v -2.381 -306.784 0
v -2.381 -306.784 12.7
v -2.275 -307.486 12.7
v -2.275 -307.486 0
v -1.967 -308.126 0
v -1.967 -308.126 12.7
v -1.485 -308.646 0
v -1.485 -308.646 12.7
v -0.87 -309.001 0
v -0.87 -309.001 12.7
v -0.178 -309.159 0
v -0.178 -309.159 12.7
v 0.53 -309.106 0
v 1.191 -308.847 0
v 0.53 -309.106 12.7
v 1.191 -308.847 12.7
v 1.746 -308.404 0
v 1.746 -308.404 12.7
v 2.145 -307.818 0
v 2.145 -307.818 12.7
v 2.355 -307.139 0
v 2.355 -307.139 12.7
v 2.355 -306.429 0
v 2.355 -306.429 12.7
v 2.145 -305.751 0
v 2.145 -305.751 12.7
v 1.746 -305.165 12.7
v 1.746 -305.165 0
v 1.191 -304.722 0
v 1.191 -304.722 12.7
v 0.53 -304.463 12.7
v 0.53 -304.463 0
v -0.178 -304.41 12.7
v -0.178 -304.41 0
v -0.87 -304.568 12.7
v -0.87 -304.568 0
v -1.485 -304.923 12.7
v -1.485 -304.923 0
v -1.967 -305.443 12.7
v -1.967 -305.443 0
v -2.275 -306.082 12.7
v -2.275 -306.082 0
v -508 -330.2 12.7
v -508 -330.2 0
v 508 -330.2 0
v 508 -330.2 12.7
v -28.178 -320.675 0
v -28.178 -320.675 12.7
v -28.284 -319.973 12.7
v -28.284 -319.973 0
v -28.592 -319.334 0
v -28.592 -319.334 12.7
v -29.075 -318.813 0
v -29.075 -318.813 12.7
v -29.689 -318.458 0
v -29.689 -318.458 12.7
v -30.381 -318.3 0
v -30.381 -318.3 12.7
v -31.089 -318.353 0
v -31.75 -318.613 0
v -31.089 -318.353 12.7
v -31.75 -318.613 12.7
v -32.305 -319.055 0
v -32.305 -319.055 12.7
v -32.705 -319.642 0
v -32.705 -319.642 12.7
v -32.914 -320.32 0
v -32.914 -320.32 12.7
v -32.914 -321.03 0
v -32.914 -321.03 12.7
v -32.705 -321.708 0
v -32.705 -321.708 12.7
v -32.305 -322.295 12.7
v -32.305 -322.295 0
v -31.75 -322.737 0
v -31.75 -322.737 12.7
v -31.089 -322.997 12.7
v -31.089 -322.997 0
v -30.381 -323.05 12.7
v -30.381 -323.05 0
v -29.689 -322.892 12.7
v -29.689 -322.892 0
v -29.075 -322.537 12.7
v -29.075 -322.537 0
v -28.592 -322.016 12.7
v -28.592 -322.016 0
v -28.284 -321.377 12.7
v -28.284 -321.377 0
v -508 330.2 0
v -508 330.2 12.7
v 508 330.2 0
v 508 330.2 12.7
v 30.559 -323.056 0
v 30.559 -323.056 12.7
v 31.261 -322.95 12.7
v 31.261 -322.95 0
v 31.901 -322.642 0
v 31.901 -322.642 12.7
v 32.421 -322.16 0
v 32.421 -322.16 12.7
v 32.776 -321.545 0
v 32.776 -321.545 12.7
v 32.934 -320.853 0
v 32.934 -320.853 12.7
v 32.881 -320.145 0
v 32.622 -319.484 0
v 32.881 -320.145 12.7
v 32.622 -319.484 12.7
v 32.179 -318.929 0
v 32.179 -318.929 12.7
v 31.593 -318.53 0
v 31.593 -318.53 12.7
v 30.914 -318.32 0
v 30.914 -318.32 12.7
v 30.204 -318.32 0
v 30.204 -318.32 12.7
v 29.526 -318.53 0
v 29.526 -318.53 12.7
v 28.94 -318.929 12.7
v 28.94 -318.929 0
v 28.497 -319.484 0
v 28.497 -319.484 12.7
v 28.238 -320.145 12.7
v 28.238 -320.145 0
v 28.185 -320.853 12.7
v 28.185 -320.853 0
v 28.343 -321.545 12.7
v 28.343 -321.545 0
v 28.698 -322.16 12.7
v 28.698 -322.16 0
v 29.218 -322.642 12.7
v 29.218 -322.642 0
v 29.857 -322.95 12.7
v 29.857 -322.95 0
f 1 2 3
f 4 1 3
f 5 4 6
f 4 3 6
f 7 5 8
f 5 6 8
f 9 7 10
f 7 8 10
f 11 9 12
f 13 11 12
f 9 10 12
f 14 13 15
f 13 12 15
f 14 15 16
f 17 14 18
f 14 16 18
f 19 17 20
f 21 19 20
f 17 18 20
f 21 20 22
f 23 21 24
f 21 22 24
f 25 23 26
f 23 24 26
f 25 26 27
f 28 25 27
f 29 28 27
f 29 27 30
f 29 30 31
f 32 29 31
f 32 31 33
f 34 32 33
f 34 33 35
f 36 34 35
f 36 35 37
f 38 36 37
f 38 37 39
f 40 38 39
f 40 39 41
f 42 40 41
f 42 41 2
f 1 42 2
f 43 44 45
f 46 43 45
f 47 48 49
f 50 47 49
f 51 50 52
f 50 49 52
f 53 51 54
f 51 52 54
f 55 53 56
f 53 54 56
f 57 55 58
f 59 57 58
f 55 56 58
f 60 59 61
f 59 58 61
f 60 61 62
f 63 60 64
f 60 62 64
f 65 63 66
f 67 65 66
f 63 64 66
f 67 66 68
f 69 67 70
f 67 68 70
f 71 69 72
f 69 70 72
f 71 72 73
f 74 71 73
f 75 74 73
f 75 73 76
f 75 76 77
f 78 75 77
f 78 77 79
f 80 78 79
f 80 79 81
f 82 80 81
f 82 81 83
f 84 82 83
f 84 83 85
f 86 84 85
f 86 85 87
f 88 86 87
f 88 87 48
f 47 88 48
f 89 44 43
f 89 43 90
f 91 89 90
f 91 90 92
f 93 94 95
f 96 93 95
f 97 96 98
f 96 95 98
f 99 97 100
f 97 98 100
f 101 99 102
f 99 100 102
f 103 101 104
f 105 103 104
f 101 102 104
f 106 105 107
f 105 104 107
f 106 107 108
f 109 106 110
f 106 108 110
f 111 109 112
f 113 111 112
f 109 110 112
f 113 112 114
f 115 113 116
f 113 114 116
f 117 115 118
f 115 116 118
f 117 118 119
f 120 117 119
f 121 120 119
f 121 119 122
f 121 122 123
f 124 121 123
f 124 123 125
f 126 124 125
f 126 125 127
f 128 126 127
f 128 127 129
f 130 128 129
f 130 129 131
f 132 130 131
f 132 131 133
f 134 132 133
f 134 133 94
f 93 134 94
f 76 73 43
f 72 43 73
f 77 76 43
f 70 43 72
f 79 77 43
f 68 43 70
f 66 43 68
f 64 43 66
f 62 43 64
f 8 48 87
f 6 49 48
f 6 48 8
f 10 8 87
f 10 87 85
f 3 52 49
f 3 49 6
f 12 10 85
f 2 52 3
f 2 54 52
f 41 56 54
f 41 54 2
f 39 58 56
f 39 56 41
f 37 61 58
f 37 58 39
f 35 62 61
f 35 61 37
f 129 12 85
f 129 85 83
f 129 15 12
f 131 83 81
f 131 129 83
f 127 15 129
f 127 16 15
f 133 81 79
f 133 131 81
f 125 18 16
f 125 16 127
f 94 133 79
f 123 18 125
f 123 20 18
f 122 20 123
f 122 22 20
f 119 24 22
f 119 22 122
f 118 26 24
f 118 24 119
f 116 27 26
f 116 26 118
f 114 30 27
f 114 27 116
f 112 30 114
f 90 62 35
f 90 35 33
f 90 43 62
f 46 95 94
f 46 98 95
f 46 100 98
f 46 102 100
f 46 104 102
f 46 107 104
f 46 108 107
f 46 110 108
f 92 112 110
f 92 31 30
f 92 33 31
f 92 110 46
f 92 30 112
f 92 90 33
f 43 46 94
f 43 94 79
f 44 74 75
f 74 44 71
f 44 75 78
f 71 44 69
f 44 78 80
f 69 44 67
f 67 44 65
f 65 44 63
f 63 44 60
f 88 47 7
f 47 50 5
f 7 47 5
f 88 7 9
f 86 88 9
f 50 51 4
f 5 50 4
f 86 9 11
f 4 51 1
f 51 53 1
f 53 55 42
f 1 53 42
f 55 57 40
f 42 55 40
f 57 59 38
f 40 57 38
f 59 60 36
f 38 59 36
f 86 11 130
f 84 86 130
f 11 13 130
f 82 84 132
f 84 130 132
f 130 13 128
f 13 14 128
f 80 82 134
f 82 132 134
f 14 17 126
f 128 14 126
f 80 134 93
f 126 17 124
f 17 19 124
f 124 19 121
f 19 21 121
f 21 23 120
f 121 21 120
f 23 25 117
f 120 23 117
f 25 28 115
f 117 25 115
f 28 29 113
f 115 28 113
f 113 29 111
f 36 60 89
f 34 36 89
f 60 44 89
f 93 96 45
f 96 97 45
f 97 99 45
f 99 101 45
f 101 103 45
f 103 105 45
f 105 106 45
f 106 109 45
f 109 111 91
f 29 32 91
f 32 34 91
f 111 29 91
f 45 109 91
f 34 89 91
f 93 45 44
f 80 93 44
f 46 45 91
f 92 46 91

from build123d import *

# Parameters (mm, degrees)
F0_W     = 1016
F0_H     = 660.4
F1_DEPTH = 12.7
F3_DEPTH = 25.4


with BuildPart() as f1:
    # F0 (on Top) → F1 (new body)
    with BuildSketch(Plane.XY):
        Rectangle(F0_W, F0_H)
    extrude(amount=F1_DEPTH)

    # F2 (on face) → F3 (cut)
    with BuildSketch(Plane.XY.offset(12.7)):
        with BuildLine():
            ThreePointArc((2.38125, -306.784375), (0, -304.403125), (-2.38125, -306.784375))
            ThreePointArc((-2.38125, -306.784375), (0, -309.165625), (2.38125, -306.784375))
        make_face()
        with BuildLine():
            ThreePointArc((28.178125, -320.675), (28.8755769773, -322.3587980227), (30.559375, -323.05625))
            Line((30.559375, -323.05625), (30.559375, -320.675))
            Line((30.559375, -320.675), (28.178125, -320.675))
        make_face()
        with BuildLine():
            Line((30.559375, -320.675), (30.559375, -323.05625))
            ThreePointArc((30.559375, -323.05625), (32.2431730227, -322.3587980227), (32.940625, -320.675))
            ThreePointArc((32.940625, -320.675), (30.559375, -318.29375), (28.178125, -320.675))
            Line((28.178125, -320.675), (30.559375, -320.675))
        make_face()
        with BuildLine():
            Line((-30.559375, -320.675), (-30.559375, -323.05625))
            ThreePointArc((-30.559375, -323.05625), (-28.8755769773, -322.3587980227), (-28.178125, -320.675))
            Line((-28.178125, -320.675), (-30.559375, -320.675))
        make_face()
        with BuildLine():
            Line((-30.559375, -318.29375), (-30.559375, -320.675))
            Line((-30.559375, -320.675), (-28.178125, -320.675))
            ThreePointArc((-28.178125, -320.675), (-28.8755769773, -318.9912019773), (-30.559375, -318.29375))
        make_face()
        with BuildLine():
            ThreePointArc((-30.559375, -318.29375), (-32.940625, -320.675), (-30.559375, -323.05625))
            Line((-30.559375, -323.05625), (-30.559375, -320.675))
            Line((-30.559375, -320.675), (-30.559375, -318.29375))
        make_face()
    extrude(amount=-F3_DEPTH, mode=Mode.SUBTRACT)


solid = f1.part
